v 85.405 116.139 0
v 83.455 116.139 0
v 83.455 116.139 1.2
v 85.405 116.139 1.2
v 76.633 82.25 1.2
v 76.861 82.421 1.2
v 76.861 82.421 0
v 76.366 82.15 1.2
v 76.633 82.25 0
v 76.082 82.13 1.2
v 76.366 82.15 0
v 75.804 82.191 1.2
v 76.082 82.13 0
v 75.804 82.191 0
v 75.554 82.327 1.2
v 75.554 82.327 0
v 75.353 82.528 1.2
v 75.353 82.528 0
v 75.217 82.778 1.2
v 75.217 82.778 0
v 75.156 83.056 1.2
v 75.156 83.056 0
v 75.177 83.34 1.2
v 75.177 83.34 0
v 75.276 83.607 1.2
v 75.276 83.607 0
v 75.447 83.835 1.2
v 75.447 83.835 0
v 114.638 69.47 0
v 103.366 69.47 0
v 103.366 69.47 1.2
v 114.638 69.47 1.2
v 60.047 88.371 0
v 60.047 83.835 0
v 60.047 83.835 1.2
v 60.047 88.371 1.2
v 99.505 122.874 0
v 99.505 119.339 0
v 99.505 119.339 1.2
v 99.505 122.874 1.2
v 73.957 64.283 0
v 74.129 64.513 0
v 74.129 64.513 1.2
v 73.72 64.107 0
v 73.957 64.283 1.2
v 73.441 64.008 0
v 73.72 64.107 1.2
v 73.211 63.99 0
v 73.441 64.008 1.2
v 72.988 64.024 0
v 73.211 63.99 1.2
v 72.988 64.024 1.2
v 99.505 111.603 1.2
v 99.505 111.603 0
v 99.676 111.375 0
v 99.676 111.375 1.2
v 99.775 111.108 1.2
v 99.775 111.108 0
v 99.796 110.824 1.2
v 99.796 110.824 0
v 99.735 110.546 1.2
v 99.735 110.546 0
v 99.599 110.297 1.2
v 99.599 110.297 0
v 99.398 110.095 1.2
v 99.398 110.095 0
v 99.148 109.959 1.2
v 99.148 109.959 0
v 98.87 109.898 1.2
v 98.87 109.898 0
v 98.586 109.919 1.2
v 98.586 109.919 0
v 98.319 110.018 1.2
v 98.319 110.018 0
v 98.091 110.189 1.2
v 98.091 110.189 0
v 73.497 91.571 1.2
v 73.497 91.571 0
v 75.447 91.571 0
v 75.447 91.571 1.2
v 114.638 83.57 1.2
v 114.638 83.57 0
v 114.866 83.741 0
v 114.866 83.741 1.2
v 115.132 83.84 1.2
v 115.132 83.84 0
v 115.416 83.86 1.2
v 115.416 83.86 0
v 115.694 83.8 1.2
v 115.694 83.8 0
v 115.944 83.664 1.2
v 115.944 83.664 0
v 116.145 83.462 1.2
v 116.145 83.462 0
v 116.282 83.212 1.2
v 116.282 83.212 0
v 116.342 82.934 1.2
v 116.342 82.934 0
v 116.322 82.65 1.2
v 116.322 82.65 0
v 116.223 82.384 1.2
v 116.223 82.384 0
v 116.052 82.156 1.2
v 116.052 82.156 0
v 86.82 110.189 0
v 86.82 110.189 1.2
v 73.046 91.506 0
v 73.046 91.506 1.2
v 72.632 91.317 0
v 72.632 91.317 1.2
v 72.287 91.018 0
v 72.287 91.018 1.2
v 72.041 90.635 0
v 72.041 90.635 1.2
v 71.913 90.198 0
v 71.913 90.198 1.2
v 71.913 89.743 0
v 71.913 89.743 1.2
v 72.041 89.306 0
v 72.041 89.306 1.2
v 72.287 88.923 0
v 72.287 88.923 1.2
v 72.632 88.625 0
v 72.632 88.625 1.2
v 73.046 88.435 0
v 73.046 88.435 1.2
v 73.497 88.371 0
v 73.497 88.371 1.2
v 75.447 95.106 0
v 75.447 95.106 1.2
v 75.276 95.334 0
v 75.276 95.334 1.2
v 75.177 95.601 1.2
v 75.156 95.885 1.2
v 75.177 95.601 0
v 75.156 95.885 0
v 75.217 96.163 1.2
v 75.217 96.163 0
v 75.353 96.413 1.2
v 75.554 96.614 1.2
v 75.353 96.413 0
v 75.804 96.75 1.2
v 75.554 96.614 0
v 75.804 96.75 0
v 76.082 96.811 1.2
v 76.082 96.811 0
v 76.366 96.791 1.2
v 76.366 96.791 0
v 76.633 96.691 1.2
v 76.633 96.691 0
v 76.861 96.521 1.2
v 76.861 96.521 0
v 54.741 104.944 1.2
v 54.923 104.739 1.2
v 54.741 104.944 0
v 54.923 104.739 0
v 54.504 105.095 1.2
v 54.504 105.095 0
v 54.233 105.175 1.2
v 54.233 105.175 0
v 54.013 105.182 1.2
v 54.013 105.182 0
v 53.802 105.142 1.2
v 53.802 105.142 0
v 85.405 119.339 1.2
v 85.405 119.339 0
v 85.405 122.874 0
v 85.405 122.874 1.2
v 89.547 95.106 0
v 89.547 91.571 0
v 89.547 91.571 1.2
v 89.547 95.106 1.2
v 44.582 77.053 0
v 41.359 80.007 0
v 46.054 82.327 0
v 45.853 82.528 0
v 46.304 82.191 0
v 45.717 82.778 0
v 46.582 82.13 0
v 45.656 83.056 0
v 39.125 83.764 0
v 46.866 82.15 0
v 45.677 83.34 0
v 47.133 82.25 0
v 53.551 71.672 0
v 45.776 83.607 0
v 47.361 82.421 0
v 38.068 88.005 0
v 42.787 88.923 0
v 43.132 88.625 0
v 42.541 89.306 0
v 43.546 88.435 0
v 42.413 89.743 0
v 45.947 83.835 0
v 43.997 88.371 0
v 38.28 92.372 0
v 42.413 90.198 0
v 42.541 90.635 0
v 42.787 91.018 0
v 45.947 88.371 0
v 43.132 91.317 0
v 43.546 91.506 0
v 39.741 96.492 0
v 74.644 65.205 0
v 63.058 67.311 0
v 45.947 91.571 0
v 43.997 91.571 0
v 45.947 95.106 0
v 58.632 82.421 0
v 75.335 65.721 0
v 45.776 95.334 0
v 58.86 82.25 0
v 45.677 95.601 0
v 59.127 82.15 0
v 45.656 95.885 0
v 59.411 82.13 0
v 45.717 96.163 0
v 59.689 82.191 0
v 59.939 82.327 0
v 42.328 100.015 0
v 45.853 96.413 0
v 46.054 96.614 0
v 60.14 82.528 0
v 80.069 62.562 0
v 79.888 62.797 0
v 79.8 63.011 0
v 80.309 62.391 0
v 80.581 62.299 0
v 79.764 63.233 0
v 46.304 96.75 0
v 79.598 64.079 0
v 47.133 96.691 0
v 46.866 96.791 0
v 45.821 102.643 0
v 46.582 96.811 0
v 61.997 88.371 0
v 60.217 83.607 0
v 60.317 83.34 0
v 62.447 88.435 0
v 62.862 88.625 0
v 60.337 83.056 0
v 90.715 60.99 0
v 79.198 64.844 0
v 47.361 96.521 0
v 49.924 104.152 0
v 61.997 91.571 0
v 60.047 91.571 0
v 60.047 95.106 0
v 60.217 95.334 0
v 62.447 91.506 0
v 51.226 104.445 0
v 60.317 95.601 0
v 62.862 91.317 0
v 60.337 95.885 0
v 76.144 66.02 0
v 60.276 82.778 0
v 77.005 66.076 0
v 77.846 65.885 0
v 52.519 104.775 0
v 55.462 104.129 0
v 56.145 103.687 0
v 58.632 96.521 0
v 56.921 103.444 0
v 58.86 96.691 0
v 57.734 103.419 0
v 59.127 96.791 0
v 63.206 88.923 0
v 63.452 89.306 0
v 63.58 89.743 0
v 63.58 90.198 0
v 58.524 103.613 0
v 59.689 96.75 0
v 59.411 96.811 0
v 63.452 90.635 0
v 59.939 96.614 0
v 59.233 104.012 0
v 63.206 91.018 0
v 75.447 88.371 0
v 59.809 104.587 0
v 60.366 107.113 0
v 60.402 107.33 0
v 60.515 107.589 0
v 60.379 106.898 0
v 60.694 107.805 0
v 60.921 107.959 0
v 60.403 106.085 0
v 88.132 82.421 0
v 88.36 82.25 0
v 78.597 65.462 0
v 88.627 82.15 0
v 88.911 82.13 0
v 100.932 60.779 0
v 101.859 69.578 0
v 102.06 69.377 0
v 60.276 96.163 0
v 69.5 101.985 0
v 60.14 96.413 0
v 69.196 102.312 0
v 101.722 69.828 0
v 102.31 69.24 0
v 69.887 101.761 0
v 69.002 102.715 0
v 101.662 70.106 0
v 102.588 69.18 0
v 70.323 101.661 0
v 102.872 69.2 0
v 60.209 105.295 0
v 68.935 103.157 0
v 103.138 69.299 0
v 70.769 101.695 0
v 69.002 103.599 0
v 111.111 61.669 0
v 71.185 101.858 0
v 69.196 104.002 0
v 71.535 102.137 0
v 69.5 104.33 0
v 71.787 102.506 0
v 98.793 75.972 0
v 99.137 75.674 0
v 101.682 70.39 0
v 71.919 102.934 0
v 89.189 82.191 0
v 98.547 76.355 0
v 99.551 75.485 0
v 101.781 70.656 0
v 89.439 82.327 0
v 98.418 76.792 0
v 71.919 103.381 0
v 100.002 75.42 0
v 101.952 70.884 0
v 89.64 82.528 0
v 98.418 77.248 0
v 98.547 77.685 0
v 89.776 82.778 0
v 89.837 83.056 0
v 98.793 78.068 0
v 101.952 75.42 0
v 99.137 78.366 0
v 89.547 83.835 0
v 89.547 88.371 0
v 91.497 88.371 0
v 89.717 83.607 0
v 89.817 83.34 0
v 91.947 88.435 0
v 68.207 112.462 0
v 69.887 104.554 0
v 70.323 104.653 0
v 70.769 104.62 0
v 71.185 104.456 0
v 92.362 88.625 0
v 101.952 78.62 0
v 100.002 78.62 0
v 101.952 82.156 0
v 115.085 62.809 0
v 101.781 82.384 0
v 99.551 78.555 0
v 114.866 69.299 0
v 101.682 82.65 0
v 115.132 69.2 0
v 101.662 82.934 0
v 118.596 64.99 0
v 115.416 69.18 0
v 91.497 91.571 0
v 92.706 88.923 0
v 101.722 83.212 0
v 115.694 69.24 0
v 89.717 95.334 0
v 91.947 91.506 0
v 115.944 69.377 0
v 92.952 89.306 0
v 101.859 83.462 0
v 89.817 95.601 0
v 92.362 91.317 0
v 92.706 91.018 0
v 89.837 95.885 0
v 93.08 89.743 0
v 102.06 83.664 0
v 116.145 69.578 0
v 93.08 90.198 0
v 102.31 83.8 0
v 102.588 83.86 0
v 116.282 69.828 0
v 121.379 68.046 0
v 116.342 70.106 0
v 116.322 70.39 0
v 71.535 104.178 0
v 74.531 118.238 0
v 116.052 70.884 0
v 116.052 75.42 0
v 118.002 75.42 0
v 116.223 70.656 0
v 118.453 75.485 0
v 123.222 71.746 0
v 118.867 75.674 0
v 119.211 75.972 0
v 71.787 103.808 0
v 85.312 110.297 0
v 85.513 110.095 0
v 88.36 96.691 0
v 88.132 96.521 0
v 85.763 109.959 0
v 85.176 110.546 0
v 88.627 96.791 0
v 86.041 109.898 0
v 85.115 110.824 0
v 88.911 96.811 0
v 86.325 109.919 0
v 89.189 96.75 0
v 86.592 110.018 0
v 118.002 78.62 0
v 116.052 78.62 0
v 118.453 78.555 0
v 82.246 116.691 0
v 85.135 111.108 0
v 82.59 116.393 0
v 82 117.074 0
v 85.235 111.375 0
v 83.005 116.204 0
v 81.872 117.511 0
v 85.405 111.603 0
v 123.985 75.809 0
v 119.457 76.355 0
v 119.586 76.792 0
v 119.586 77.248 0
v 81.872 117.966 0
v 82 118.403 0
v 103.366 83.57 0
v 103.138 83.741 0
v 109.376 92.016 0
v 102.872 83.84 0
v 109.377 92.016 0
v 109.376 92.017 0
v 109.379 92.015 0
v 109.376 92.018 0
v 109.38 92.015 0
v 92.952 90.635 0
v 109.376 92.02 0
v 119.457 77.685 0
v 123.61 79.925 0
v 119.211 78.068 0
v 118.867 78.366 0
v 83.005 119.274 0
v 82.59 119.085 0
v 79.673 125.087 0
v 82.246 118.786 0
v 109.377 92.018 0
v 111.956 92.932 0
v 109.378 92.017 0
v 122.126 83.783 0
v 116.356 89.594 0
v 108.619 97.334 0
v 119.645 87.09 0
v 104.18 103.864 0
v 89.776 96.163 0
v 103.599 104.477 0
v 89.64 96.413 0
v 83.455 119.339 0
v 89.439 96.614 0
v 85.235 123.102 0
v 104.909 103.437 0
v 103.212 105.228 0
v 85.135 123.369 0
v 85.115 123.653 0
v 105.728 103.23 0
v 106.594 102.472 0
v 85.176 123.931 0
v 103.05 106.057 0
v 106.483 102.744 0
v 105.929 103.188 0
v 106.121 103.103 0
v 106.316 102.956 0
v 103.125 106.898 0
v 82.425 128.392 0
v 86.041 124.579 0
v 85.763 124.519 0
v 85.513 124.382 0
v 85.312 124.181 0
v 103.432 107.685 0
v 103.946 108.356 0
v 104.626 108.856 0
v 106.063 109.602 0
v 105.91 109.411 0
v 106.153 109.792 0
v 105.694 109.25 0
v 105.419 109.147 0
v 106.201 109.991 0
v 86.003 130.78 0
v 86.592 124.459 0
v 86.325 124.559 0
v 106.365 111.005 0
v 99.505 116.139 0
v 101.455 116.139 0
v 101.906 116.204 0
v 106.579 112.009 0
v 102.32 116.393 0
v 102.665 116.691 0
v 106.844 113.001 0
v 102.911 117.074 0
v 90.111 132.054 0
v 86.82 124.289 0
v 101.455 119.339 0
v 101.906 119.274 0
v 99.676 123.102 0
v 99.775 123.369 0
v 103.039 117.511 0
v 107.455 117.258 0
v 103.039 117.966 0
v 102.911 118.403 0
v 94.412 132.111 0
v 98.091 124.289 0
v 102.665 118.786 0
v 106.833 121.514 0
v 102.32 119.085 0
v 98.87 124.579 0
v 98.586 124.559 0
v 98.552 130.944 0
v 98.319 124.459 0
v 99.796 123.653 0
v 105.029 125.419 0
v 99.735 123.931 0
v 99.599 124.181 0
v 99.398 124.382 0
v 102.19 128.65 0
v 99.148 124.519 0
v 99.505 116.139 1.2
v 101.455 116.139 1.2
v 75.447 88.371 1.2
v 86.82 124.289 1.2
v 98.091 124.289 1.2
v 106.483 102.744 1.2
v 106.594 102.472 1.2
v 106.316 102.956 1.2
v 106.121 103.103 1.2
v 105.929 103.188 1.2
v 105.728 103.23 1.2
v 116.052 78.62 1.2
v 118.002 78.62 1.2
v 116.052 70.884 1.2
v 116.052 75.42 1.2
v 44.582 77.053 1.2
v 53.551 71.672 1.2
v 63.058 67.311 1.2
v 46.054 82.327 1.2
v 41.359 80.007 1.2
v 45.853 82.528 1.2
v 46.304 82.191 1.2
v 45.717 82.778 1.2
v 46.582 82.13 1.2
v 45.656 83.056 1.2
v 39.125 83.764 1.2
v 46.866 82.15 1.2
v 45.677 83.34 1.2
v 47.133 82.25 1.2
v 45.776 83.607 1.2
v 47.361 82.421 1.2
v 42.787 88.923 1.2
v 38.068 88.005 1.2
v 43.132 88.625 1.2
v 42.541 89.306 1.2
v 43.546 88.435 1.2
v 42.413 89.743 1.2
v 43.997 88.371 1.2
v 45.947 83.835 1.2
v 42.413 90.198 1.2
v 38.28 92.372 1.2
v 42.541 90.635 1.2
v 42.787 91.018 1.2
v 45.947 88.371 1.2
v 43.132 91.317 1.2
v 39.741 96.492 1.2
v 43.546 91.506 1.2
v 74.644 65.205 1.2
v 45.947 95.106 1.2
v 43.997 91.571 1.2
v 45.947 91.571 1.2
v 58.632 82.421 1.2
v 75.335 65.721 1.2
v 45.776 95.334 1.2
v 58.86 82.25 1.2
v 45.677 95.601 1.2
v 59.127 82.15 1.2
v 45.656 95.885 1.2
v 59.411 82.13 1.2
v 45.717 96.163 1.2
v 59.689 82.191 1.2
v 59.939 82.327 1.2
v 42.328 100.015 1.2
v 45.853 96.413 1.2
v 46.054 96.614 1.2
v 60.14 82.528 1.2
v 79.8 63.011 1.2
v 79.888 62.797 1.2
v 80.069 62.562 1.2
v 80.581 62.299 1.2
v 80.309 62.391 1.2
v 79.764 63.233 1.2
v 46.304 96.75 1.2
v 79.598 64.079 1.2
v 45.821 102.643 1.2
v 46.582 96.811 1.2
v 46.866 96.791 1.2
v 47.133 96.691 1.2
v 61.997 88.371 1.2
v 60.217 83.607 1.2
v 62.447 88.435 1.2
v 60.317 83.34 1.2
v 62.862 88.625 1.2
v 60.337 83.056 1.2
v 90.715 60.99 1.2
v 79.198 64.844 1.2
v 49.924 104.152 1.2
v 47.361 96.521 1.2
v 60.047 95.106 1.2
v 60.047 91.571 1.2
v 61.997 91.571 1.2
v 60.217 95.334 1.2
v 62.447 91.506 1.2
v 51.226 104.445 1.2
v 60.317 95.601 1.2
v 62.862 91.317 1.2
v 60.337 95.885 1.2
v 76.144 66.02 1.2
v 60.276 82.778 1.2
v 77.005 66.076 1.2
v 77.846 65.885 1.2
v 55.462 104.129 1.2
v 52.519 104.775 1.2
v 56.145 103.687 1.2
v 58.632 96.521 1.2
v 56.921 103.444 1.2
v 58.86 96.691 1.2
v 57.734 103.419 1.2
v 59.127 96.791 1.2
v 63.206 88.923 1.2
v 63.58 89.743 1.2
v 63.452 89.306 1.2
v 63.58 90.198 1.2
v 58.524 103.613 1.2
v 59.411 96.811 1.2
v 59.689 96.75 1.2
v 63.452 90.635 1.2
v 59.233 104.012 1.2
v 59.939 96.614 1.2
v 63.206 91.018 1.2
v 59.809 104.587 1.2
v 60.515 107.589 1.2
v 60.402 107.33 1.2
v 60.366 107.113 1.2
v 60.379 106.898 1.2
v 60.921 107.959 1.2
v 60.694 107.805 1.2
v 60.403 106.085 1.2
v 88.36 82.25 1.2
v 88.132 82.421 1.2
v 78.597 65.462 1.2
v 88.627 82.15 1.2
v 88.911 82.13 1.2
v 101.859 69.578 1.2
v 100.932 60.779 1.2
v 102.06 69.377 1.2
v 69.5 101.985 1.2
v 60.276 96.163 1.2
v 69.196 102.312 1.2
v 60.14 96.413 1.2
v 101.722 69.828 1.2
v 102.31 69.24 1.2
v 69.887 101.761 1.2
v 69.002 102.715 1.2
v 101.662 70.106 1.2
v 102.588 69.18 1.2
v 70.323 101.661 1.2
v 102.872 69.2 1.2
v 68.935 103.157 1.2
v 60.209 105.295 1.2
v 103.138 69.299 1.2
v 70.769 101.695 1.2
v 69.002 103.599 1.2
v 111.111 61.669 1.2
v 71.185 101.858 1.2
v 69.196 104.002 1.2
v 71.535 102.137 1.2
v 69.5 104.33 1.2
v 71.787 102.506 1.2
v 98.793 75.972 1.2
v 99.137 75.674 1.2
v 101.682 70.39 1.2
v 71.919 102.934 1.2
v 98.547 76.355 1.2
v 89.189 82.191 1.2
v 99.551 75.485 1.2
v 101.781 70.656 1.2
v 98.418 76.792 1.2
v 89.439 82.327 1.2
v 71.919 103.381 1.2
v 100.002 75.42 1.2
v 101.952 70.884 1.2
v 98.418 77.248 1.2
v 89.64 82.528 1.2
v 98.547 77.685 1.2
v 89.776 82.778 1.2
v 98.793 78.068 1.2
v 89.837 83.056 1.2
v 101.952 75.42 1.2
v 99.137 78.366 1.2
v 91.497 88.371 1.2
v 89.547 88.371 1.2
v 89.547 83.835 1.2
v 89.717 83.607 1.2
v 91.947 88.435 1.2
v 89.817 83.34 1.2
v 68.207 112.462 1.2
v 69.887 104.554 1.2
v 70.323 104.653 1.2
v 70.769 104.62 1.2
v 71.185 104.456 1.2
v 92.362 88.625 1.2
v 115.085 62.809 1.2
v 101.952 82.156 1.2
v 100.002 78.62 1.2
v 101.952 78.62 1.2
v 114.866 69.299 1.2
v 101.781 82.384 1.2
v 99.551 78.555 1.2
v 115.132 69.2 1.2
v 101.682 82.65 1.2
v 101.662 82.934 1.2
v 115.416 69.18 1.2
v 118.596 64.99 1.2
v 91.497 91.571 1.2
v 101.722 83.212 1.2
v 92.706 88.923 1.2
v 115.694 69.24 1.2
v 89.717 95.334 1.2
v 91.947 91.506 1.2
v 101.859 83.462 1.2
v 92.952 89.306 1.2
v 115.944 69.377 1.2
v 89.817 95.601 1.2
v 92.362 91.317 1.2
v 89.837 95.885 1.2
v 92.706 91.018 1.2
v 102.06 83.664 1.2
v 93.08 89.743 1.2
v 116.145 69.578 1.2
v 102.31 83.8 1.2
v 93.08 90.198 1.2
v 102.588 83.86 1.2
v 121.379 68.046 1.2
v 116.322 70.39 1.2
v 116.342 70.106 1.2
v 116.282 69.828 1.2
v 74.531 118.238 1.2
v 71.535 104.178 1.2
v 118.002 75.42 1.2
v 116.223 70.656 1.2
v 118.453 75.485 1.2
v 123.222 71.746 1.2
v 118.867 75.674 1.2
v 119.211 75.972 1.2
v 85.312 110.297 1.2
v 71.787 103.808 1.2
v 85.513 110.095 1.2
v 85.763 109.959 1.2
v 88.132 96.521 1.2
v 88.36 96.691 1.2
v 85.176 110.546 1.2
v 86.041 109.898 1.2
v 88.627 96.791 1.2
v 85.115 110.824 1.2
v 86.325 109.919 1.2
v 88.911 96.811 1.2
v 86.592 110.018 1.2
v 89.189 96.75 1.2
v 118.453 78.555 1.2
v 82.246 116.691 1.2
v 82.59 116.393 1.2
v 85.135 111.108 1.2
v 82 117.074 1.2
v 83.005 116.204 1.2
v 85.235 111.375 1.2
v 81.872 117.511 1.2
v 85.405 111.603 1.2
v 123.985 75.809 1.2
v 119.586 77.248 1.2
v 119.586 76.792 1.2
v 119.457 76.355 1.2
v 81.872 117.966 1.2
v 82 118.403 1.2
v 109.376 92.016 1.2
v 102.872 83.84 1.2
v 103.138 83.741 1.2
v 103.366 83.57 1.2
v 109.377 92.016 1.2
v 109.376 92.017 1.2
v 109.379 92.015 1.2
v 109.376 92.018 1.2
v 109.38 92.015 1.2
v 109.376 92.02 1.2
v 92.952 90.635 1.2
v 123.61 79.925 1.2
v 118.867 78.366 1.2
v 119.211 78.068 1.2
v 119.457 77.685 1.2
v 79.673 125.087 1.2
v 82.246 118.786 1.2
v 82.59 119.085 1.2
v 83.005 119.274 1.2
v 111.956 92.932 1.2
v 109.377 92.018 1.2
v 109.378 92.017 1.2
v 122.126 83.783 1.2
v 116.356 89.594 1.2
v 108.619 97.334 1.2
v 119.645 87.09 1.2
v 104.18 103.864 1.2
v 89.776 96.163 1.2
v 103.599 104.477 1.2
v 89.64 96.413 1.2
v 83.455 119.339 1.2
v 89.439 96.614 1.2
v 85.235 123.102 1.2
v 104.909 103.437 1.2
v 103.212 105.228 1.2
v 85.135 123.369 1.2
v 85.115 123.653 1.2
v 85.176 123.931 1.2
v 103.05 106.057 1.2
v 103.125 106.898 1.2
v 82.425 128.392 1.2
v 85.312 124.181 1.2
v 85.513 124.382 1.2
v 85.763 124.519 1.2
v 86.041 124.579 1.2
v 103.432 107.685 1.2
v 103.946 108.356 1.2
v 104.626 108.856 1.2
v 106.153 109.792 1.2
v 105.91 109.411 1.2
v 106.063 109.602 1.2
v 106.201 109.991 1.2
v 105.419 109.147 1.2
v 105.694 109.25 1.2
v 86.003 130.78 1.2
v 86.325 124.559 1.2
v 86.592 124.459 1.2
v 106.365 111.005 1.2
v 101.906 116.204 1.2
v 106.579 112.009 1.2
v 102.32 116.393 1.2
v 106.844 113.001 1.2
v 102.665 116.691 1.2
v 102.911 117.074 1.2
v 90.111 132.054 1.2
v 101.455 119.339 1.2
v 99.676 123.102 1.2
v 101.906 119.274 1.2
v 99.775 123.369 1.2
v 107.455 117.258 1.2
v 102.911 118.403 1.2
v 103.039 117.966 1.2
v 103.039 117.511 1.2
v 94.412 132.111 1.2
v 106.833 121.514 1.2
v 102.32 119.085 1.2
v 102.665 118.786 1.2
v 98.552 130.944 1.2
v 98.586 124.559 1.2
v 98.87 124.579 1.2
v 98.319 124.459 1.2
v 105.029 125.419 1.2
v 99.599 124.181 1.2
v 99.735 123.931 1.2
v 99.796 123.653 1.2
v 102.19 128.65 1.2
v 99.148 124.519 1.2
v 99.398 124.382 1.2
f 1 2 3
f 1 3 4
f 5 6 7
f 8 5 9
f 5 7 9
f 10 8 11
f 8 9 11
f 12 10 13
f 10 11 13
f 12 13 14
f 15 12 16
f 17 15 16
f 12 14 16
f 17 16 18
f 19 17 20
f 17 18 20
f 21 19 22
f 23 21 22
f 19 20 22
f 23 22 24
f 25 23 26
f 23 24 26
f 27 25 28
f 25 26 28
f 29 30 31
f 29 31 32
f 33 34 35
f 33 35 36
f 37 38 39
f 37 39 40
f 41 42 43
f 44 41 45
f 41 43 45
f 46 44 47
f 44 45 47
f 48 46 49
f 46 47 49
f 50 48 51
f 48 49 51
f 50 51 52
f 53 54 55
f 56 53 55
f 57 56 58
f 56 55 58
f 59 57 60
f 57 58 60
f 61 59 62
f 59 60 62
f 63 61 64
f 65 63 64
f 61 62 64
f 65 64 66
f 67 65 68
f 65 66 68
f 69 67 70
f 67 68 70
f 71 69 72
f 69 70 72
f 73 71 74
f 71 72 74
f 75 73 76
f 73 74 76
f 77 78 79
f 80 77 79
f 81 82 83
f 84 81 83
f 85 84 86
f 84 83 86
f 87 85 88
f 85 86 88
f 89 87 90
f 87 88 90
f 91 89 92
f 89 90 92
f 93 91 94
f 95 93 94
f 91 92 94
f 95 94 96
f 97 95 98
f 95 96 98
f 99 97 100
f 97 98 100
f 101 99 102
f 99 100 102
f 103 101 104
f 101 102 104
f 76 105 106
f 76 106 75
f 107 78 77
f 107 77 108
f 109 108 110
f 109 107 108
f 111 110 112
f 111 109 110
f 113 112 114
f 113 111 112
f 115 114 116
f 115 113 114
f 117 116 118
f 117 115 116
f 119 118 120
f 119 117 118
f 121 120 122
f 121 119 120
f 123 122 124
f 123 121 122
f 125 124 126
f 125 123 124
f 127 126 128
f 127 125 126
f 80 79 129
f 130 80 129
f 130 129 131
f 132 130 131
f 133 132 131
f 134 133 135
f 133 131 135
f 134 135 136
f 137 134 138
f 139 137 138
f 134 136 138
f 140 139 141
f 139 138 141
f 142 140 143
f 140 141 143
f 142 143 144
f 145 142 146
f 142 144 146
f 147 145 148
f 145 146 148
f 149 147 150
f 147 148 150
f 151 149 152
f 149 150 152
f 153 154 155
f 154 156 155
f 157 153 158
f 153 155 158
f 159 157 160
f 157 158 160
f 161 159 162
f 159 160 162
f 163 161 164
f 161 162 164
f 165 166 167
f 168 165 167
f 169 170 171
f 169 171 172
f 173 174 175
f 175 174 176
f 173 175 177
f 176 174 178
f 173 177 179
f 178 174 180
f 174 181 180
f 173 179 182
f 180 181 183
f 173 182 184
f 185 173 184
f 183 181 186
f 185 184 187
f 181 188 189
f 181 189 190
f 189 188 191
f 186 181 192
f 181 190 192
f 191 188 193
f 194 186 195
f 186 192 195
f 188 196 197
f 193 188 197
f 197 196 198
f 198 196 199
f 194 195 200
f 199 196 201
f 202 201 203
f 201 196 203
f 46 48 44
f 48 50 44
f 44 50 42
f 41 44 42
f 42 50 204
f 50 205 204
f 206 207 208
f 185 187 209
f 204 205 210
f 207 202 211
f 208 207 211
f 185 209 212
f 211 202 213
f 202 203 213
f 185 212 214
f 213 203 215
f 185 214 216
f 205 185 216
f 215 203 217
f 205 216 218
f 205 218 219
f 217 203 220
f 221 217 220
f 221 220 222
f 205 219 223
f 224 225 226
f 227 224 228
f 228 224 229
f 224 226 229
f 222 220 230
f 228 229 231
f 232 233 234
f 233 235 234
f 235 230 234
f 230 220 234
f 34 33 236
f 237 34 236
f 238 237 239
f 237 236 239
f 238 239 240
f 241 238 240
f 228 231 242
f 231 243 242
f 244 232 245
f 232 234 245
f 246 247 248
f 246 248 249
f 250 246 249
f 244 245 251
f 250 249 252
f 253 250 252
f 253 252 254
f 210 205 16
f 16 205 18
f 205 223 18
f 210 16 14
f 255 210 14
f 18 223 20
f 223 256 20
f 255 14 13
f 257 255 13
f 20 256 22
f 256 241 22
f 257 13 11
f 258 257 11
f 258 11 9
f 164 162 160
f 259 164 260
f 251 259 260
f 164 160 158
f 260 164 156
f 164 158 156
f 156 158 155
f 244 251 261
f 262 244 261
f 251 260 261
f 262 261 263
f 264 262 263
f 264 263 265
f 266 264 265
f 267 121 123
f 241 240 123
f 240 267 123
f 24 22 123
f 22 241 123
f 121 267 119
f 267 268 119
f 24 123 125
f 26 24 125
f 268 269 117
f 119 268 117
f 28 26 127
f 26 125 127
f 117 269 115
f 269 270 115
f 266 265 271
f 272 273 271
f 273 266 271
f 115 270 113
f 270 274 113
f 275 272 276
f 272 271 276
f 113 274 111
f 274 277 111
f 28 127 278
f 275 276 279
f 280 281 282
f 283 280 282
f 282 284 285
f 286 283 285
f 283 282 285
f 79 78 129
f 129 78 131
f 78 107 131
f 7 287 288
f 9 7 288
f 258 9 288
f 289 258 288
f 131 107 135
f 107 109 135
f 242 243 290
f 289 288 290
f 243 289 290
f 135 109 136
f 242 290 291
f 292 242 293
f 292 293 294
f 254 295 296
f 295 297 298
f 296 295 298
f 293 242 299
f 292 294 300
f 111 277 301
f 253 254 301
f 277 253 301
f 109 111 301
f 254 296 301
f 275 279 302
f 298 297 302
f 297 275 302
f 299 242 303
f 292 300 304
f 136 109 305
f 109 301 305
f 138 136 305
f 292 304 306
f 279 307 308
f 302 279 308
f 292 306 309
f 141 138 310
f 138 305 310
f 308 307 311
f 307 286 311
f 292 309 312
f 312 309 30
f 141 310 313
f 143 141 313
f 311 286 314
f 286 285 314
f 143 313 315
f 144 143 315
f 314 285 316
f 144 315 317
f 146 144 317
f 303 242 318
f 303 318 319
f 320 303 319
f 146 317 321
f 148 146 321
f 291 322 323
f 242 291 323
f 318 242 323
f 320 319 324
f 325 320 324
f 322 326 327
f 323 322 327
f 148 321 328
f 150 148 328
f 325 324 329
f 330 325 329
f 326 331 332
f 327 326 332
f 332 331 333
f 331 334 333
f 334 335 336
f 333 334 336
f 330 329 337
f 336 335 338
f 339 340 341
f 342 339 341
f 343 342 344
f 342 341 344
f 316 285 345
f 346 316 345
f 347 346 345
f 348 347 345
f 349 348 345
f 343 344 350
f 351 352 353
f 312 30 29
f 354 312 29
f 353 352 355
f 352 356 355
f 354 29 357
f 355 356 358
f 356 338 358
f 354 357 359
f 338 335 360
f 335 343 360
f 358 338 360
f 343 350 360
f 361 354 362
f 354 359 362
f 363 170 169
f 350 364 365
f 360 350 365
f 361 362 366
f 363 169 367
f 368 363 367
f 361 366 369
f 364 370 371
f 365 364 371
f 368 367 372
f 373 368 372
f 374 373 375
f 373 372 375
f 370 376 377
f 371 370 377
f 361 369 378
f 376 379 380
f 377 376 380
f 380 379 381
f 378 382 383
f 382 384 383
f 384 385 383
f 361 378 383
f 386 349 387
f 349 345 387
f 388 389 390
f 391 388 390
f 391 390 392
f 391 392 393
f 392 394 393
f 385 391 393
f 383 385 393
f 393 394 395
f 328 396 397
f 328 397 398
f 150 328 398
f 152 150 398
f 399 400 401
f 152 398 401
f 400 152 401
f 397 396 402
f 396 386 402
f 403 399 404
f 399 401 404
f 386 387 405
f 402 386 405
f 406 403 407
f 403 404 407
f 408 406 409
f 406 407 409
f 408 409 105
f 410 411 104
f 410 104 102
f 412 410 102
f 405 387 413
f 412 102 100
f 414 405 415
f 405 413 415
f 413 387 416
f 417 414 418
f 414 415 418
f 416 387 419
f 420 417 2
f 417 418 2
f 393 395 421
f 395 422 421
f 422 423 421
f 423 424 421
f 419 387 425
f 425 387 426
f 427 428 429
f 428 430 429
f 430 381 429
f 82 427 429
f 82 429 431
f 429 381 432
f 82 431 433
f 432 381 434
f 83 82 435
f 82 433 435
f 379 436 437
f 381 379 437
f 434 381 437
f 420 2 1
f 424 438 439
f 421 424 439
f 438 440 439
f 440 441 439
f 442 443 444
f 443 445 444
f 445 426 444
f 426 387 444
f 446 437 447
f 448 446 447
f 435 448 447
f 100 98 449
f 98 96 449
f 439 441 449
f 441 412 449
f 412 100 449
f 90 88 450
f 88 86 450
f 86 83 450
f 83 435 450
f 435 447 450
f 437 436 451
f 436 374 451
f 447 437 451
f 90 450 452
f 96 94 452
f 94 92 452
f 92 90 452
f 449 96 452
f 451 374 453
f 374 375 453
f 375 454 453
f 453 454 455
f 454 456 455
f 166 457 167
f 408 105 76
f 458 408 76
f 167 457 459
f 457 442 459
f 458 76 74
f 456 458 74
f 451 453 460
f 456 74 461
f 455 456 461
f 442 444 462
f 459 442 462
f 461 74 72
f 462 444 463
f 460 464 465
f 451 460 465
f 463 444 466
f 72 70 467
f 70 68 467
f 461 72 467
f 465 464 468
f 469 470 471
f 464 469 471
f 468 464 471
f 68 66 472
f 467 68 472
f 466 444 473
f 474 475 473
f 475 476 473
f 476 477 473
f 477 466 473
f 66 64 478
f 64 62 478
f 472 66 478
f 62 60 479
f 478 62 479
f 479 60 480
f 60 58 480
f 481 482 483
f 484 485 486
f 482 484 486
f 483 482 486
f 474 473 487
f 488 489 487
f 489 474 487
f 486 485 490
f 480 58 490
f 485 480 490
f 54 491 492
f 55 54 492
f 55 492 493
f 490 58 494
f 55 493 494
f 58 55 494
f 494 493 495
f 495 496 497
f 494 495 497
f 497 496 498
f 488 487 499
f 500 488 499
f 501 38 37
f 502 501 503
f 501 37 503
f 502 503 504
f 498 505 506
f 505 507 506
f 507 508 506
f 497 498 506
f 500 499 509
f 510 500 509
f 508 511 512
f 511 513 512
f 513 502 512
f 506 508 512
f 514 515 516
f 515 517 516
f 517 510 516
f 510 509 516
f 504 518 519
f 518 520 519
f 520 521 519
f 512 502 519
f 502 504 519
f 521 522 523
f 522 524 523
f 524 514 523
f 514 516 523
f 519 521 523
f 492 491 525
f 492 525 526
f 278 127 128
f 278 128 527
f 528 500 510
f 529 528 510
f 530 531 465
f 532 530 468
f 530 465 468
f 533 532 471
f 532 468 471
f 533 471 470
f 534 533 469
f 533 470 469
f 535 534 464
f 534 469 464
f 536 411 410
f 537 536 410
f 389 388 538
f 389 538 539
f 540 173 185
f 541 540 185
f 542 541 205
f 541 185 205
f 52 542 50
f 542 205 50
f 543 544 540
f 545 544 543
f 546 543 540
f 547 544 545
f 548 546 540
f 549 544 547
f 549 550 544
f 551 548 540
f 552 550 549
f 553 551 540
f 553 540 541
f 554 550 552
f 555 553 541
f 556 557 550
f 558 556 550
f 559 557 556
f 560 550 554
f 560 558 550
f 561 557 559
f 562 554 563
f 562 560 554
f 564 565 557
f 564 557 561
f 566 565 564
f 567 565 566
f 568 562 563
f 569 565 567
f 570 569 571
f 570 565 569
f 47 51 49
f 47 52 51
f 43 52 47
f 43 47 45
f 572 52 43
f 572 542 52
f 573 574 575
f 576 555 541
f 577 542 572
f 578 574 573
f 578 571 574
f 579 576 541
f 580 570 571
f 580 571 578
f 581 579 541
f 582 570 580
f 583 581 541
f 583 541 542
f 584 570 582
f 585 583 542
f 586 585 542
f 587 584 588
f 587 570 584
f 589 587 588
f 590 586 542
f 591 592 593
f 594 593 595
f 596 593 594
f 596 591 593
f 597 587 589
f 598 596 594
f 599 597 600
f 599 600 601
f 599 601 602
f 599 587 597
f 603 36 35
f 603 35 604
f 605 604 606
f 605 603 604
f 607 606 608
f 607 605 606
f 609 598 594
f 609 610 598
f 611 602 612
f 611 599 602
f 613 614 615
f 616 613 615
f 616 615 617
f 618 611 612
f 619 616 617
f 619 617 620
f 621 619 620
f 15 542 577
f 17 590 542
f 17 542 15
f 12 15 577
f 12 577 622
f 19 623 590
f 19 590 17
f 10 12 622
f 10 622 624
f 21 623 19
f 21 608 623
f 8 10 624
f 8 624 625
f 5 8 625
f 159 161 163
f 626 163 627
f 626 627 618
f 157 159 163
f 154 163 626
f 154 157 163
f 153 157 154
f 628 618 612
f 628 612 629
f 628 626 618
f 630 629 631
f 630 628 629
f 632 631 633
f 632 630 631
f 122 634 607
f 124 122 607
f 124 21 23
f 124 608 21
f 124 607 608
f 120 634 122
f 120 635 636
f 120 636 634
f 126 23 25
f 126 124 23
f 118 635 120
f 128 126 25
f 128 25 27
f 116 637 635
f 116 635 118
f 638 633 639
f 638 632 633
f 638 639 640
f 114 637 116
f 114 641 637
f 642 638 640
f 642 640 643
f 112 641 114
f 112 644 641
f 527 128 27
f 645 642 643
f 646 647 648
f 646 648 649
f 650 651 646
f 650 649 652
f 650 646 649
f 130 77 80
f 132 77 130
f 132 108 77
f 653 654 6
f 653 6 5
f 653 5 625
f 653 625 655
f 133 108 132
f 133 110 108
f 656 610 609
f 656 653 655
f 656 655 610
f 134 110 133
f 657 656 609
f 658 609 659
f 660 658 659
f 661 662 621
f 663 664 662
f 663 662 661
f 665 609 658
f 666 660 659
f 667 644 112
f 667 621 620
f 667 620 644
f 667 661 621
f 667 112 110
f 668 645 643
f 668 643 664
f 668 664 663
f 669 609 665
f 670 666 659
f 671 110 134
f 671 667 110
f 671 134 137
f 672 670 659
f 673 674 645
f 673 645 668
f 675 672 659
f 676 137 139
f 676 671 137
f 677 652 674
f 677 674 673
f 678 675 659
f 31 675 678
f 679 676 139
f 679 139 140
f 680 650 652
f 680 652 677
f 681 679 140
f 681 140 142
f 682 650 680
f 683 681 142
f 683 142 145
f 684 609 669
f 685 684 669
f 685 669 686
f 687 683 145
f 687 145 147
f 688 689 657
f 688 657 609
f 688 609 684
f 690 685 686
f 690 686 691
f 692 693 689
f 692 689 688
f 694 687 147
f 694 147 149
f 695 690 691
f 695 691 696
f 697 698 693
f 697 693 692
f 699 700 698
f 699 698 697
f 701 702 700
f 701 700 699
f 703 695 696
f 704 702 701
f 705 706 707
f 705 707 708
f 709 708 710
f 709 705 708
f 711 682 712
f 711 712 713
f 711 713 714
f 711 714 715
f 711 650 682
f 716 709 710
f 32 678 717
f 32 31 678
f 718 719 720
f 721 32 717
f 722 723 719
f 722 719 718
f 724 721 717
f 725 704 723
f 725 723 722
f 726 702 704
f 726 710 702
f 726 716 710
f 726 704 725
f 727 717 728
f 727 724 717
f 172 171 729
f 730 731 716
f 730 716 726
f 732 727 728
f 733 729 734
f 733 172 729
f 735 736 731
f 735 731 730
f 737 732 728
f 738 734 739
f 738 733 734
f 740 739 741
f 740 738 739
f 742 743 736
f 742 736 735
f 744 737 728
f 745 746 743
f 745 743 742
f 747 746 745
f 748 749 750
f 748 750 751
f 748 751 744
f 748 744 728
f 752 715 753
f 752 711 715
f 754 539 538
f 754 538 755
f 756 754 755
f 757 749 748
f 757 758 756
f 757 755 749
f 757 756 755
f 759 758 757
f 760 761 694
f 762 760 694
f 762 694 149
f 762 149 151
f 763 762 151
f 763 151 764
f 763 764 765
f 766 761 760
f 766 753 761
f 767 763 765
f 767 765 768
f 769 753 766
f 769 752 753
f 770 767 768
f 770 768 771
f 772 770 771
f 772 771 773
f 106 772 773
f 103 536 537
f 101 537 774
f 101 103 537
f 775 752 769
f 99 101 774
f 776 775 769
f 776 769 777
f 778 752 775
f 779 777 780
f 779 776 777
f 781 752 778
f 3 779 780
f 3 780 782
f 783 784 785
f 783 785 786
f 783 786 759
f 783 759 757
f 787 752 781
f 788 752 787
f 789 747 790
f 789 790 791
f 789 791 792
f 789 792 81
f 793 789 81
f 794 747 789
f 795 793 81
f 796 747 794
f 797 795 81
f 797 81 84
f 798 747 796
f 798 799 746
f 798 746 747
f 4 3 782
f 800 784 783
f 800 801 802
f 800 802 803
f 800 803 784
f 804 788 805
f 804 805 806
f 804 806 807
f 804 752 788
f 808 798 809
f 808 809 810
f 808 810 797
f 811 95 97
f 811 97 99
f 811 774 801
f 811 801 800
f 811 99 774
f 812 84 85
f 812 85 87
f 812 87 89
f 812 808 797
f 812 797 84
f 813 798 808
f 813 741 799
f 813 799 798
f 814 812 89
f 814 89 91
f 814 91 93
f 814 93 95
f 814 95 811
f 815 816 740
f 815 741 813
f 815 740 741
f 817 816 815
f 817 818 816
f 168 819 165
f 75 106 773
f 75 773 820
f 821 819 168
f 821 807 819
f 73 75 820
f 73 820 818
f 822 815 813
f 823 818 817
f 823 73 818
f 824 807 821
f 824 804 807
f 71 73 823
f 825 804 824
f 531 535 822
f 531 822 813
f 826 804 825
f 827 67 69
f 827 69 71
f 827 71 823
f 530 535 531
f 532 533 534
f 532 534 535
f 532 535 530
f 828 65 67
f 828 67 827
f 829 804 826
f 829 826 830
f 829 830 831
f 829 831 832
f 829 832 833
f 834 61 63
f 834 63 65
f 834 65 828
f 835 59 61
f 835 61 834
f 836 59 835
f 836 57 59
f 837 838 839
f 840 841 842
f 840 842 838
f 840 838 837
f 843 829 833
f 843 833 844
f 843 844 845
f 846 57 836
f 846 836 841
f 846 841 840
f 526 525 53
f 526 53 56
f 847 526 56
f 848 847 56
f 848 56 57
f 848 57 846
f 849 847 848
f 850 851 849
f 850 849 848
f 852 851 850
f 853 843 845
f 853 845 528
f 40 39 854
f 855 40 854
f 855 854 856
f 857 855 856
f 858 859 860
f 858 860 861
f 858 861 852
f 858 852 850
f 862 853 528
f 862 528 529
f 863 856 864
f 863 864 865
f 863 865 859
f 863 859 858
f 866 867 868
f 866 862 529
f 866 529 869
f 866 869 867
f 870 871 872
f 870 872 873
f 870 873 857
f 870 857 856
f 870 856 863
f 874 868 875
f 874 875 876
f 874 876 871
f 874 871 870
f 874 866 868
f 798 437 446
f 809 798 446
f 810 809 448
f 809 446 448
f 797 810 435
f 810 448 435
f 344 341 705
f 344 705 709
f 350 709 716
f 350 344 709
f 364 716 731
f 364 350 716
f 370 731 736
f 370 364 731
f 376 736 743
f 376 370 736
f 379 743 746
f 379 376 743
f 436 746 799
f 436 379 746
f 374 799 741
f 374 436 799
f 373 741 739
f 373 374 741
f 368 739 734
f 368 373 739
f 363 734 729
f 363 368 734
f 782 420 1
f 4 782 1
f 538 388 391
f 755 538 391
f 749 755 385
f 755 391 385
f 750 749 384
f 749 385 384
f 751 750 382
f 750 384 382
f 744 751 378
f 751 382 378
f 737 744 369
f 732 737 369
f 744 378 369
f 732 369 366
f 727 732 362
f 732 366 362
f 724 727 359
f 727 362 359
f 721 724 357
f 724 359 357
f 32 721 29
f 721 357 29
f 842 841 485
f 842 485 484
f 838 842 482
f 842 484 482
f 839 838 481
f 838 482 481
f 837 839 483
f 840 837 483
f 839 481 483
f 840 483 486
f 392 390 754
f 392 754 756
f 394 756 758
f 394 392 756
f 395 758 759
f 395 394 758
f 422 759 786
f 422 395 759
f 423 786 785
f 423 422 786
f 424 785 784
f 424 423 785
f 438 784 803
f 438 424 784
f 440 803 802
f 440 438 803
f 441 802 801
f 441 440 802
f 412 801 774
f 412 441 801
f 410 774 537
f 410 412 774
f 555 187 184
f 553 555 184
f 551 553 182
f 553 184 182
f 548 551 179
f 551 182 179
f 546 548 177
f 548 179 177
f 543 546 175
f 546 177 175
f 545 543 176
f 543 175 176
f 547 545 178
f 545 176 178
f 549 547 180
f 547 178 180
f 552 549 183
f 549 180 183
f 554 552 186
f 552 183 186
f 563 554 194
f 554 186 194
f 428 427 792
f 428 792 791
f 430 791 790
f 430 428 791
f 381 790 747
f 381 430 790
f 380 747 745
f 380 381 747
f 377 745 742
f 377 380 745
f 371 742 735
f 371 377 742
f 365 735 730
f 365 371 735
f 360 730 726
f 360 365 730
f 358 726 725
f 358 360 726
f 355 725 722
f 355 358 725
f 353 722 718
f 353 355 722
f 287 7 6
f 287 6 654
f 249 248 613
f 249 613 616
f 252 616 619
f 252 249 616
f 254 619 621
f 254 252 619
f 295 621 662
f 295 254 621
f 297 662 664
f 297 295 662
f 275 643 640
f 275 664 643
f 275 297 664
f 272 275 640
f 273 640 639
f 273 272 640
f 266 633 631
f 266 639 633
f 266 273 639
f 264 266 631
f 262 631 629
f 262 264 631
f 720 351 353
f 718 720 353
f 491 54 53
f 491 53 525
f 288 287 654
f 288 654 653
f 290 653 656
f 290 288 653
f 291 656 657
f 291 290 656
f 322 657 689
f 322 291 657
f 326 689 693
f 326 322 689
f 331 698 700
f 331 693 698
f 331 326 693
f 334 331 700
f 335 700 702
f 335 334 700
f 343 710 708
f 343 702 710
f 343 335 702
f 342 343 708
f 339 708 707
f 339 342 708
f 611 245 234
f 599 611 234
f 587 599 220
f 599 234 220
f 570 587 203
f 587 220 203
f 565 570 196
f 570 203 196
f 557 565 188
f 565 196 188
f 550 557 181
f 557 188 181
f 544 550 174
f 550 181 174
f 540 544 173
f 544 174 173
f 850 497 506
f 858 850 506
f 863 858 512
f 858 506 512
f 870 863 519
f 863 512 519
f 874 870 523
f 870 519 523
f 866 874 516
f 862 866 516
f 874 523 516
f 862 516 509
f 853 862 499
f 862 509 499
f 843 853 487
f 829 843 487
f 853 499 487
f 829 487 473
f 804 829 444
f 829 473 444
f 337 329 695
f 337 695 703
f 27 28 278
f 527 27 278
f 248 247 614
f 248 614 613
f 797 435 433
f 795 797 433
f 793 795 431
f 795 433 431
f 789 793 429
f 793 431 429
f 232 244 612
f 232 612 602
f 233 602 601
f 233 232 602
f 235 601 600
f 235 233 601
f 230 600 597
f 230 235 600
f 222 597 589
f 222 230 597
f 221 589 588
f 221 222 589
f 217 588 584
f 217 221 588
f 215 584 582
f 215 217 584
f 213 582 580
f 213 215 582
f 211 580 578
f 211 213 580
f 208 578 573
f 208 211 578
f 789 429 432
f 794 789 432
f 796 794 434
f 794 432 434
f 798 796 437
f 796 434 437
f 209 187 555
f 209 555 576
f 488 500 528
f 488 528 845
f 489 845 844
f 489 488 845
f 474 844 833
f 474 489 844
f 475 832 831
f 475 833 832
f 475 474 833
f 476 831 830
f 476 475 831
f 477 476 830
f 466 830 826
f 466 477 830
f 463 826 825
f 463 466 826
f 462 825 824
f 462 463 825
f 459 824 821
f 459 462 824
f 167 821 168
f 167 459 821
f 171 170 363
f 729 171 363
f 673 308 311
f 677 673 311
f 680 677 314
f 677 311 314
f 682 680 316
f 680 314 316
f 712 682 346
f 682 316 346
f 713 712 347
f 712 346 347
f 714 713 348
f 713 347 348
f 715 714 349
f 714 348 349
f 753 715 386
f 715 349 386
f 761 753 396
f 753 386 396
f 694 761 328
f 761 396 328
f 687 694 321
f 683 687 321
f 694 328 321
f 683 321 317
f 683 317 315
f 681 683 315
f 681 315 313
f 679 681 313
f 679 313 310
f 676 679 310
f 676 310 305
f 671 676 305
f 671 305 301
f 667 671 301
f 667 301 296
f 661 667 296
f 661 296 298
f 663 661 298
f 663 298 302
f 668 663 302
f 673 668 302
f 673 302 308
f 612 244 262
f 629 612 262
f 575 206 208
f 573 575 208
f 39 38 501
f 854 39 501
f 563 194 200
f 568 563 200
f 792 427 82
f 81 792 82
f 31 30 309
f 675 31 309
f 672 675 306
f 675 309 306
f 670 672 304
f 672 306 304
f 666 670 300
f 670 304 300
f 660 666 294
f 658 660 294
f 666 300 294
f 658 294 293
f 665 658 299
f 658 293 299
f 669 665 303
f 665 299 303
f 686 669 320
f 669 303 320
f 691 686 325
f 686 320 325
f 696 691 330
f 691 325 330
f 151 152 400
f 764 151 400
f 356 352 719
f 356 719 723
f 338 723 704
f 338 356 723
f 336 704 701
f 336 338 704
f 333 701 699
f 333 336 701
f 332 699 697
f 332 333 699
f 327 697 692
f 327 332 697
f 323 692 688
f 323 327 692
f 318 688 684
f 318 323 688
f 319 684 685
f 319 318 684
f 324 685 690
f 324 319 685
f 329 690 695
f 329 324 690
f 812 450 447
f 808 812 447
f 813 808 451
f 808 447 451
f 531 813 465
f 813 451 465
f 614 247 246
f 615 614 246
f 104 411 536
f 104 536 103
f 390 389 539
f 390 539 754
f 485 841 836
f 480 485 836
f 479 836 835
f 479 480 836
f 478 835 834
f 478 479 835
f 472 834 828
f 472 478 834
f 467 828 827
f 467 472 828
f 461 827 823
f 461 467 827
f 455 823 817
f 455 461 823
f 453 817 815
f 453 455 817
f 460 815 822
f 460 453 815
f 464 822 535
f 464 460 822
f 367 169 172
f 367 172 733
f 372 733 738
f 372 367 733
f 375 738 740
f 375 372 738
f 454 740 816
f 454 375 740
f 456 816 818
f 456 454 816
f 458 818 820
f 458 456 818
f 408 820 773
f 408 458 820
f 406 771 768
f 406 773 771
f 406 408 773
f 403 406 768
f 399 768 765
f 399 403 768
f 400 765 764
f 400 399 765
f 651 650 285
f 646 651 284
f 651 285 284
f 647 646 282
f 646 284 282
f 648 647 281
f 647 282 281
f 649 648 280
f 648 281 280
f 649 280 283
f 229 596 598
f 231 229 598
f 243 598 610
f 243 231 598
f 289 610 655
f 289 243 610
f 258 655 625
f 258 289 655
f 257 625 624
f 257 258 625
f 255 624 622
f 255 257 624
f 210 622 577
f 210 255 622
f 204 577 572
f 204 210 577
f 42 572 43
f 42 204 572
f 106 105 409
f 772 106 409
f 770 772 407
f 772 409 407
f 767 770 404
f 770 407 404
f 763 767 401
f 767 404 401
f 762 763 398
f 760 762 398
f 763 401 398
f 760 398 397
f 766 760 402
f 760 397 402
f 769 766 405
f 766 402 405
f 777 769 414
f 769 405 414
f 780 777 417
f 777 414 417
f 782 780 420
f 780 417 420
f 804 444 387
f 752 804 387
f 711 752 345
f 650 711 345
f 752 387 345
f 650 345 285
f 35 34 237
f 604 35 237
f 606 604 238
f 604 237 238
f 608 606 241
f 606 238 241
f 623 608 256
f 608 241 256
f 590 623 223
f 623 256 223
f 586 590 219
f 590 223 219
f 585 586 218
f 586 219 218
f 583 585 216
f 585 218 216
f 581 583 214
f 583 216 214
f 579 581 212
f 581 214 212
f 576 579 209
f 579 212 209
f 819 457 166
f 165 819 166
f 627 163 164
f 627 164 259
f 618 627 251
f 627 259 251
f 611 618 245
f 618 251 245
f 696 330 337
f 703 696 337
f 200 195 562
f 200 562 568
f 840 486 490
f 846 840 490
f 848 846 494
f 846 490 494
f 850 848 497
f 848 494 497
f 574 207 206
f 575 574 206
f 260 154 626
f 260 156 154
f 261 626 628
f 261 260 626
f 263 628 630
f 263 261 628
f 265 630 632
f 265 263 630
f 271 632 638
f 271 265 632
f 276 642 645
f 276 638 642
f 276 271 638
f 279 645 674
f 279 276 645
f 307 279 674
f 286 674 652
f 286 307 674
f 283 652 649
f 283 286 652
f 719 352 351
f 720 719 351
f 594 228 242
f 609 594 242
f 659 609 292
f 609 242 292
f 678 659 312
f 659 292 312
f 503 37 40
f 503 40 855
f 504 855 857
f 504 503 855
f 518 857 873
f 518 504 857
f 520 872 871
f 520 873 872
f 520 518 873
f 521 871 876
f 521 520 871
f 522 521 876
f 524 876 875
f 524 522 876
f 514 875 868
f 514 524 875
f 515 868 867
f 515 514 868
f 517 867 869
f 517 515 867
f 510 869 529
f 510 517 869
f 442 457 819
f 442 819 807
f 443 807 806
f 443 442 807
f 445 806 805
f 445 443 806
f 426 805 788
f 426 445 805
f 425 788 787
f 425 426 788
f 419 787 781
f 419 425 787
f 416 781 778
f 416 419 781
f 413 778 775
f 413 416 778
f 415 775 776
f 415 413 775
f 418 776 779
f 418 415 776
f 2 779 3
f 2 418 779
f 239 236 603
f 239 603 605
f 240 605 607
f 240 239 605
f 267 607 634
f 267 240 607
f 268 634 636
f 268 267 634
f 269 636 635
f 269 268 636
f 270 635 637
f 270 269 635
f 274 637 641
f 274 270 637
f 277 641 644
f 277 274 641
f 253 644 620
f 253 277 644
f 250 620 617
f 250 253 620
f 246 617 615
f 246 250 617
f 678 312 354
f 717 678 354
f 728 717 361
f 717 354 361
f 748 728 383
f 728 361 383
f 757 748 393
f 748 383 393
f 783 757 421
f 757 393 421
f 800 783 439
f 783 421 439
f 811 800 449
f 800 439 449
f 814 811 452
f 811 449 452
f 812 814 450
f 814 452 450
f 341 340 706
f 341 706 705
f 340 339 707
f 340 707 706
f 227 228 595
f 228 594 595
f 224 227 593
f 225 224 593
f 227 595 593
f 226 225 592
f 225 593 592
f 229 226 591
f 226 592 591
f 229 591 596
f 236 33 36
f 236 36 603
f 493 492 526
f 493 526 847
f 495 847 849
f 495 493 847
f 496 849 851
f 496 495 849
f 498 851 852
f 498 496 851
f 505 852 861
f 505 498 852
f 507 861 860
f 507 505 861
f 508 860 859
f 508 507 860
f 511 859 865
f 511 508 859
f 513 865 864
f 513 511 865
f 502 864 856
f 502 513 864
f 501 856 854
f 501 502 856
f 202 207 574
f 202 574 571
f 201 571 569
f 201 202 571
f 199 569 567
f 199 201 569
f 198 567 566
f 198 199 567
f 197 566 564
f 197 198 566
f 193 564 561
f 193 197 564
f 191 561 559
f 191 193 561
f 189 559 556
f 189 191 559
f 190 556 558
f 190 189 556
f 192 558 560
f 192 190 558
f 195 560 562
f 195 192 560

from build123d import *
from build123d.topology import SkipClean

# Parameters (mm, degrees)
BOSS_EXTRUDE1_DEPTH   = 1.2
SKETCH8_3_R           = 3
CUT_EXTRUDE1_DEPTH    = 182.287051241
SKETCH16_R            = 1.6
SKETCH16_W            = 18
SKETCH16_H            = 3.2
CUT_EXTRUDE2_DEPTH    = 182.287051241
CUT_EXTRUDE3_DEPTH    = 182.287051241
SKETCH9_W             = 14.1
SKETCH9_H             = 14.1
CUT_EXTRUDE4_DEPTH    = 182.287051241
F_3_0MM_DOWEL_HOLE1_D = 3
FILLET1_R             = 1


with BuildPart() as part:
    # Sketch8 → Boss-Extrude1 (new body)
    with BuildSketch(Plane.XY):
        with BuildLine():
            ThreePointArc((73.852303576, 63.794594289), (73.863549821, 63.839319131), (73.875482243, 63.883865813))
            ThreePointArc((73.875482243, 63.883865813), (76.767270103, 63.085390407), (79.729789892, 62.612657392))
            ThreePointArc((79.729789892, 62.612657392), (79.717062502, 62.538833177), (79.702495752, 62.465349771))
            ThreePointArc((79.702495752, 62.465349771), (95.373691885, 60.7573177), (111.111302129, 61.669121188))
            ThreePointArc((111.111302129, 61.669121188), (123.74416397, 73.75113123), (116.356165737, 89.593531525))
            ThreePointArc((116.356165737, 89.593531525), (107.510169126, 99.635128091), (106.844308874, 113.000828513))
            ThreePointArc((106.844308874, 113.000828513), (98.551785503, 130.943955248), (79.67265081, 125.087333856))
            ThreePointArc((79.67265081, 125.087333856), (66.957923375, 111.551078569), (49.923987164, 104.152462611))
            ThreePointArc((49.923987164, 104.152462611), (38.279791522, 92.371702096), (44.581782069, 77.053134095))
            ThreePointArc((44.581782069, 77.053134095), (58.651333394, 69.17496271), (73.852303576, 63.794594289))
        make_face()
        with BuildLine():
            ThreePointArc((56.72077423, 104.000844147), (56.721683918, 104.00117089), (56.7225936, 104.001497652))
            ThreePointArc((56.7225936, 104.001497652), (56.755397532, 103.992206145), (56.788325126, 103.983362865))
            ThreePointArc((56.788325126, 103.983362865), (56.754559843, 103.992142785), (56.72077423, 104.000844147))
        make_face(mode=Mode.SUBTRACT)
        with BuildLine():
            ThreePointArc((109.376341775, 92.015545509), (109.37615287, 92.017539878), (109.375963817, 92.019534234))
            ThreePointArc((109.375963817, 92.019534234), (109.377797318, 92.017499849), (109.379631064, 92.015465685))
            ThreePointArc((109.379631064, 92.015465685), (109.377986421, 92.015505684), (109.376341775, 92.015545509))
        make_face(mode=Mode.SUBTRACT)
        with BuildLine():
            ThreePointArc((103.532400156, 106.396636288), (103.543227812, 106.407709628), (103.554044399, 106.418793781))
            ThreePointArc((103.554044399, 106.418793781), (103.552293137, 106.396310438), (103.550744757, 106.373812212))
            ThreePointArc((103.550744757, 106.373812212), (103.541575551, 106.385226737), (103.532400156, 106.396636288))
        make_face(mode=Mode.SUBTRACT)
        with BuildLine():
            ThreePointArc((104.021801646, 107.681154775), (104.021865069, 107.684582448), (104.021929019, 107.688010111))
            ThreePointArc((104.021929019, 107.688010111), (104.063142491, 107.7381429), (104.104138674, 107.788453533))
            ThreePointArc((104.104138674, 107.788453533), (104.062244422, 107.735361058), (104.021801646, 107.681154775))
        make_face(mode=Mode.SUBTRACT)
    extrude(amount=BOSS_EXTRUDE1_DEPTH)

    # Sketch8<3> → Cut-Extrude1 (cut, through all)
    with SkipClean():  # the faces are left unmerged after this step: merging them gives an invalid solid
        with BuildSketch(Plane.XY):
            with Locations((106.04559389, 106.21341333)):
                Circle(SKETCH8_3_R)
            with Locations((76.767270103, 63.085390407)):
                Circle(SKETCH8_3_R)
            with Locations((57.420286528, 106.402169345)):
                Circle(SKETCH8_3_R)
        extrude(amount=CUT_EXTRUDE1_DEPTH, mode=Mode.SUBTRACT)

    # Sketch16 → Cut-Extrude2 (cut, through all)
    with SkipClean():  # the faces are left unmerged after this step: merging them gives an invalid solid
        with BuildSketch(Plane.XY):
            with Locations((43.996556322, 89.970524089)):
                Circle(SKETCH16_R)
            with Locations((61.996556322, 89.970524089)):
                Circle(SKETCH16_R)
            with Locations((73.496556322, 89.970524089)):
                Circle(SKETCH16_R)
            with Locations((91.496556322, 89.970524089)):
                Circle(SKETCH16_R)
            with Locations((100.001946024, 77.020067852)):
                Circle(SKETCH16_R)
            with Locations((118.001946024, 77.020067852)):
                Circle(SKETCH16_R)
            with Locations((83.45540719, 117.738694526)):
                Circle(SKETCH16_R)
            with Locations((101.45540719, 117.738694526)):
                Circle(SKETCH16_R)
            with Locations((52.996556322, 89.970524089)):
                Rectangle(SKETCH16_W, SKETCH16_H)
            with Locations((82.496556322, 89.970524089)):
                Rectangle(SKETCH16_W, SKETCH16_H)
            with Locations((109.001946024, 77.020067852)):
                Rectangle(SKETCH16_W, SKETCH16_H)
            with Locations((92.45540719, 117.738694526)):
                Rectangle(SKETCH16_W, SKETCH16_H)
        extrude(amount=CUT_EXTRUDE2_DEPTH, mode=Mode.SUBTRACT)

    # Sketch14 → Cut-Extrude3 (cut, through all)
    with SkipClean():  # the faces are left unmerged after this step: merging them gives an invalid solid
        with BuildSketch(Plane.XY):
            with BuildLine():
                Line((45.946556322, 95.106310527), (47.360769884, 96.520524089))
                ThreePointArc((47.360769884, 96.520524089), (45.946556322, 96.520524089), (45.946556322, 95.106310527))
            make_face()
            with BuildLine():
                Line((45.946556322, 83.834737652), (47.360769884, 82.420524089))
                ThreePointArc((47.360769884, 82.420524089), (45.946556322, 82.420524089), (45.946556322, 83.834737652))
            make_face()
            with BuildLine():
                Line((58.63234276, 82.420524089), (60.046556322, 83.834737652))
                ThreePointArc((60.046556322, 83.834737652), (60.046556322, 82.420524089), (58.63234276, 82.420524089))
            make_face()
            with BuildLine():
                Line((58.63234276, 96.520524089), (60.046556322, 95.106310527))
                ThreePointArc((60.046556322, 95.106310527), (60.046556322, 96.520524089), (58.63234276, 96.520524089))
            make_face()
            with BuildLine():
                Line((85.40540719, 111.602908088), (86.819620752, 110.188694526))
                ThreePointArc((86.819620752, 110.188694526), (85.40540719, 110.188694526), (85.40540719, 111.602908088))
            make_face()
            with BuildLine():
                Line((98.091193628, 110.188694526), (99.50540719, 111.602908088))
                ThreePointArc((99.50540719, 111.602908088), (99.50540719, 110.188694526), (98.091193628, 110.188694526))
            make_face()
            with BuildLine():
                Line((98.091193628, 124.288694526), (99.50540719, 122.874480963))
                ThreePointArc((99.50540719, 122.874480963), (99.50540719, 124.288694526), (98.091193628, 124.288694526))
            make_face()
            with BuildLine():
                Line((85.40540719, 122.874480963), (86.819620752, 124.288694526))
                ThreePointArc((86.819620752, 124.288694526), (85.40540719, 124.288694526), (85.40540719, 122.874480963))
            make_face()
            with BuildLine():
                Line((101.951946024, 82.155854289), (103.366159586, 83.570067852))
                ThreePointArc((103.366159586, 83.570067852), (101.951946024, 83.570067852), (101.951946024, 82.155854289))
            make_face()
            with BuildLine():
                Line((101.951946024, 70.884281414), (103.366159586, 69.470067852))
                ThreePointArc((103.366159586, 69.470067852), (101.951946024, 69.470067852), (101.951946024, 70.884281414))
            make_face()
            with BuildLine():
                Line((114.637732461, 69.470067852), (116.051946024, 70.884281414))
                ThreePointArc((116.051946024, 70.884281414), (116.051946024, 69.470067852), (114.637732461, 69.470067852))
            make_face()
            with BuildLine():
                Line((116.051946024, 82.155854289), (114.637732461, 83.570067852))
                ThreePointArc((114.637732461, 83.570067852), (116.051946024, 83.570067852), (116.051946024, 82.155854289))
            make_face()
            with BuildLine():
                Line((76.860769884, 96.520524089), (75.446556322, 95.106310527))
                ThreePointArc((75.446556322, 95.106310527), (75.446556322, 96.520524089), (76.860769884, 96.520524089))
            make_face()
            with BuildLine():
                Line((88.13234276, 96.520524089), (89.546556322, 95.106310527))
                ThreePointArc((89.546556322, 95.106310527), (89.546556322, 96.520524089), (88.13234276, 96.520524089))
            make_face()
            with BuildLine():
                Line((89.546556322, 83.834737652), (88.13234276, 82.420524089))
                ThreePointArc((88.13234276, 82.420524089), (89.546556322, 82.420524089), (89.546556322, 83.834737652))
            make_face()
            with BuildLine():
                Line((75.446556322, 83.834737652), (76.860769884, 82.420524089))
                ThreePointArc((76.860769884, 82.420524089), (75.446556322, 82.420524089), (75.446556322, 83.834737652))
            make_face()
        extrude(amount=CUT_EXTRUDE3_DEPTH, mode=Mode.SUBTRACT)

    # Sketch9 → Cut-Extrude4 (cut, through all)
    with SkipClean():  # the faces are left unmerged after this step: merging them gives an invalid solid
        with BuildSketch(Plane.XY):
            with Locations((52.996556322, 89.470524089)):
                Rectangle(SKETCH9_W, SKETCH9_H)
            with Locations((82.496556322, 89.470524089)):
                Rectangle(SKETCH9_W, SKETCH9_H)
            with Locations((109.001946024, 76.520067852)):
                Rectangle(SKETCH9_W, SKETCH9_H)
            with Locations((92.45540719, 117.238694526)):
                Rectangle(SKETCH9_W, SKETCH9_H)
        extrude(amount=CUT_EXTRUDE4_DEPTH, mode=Mode.SUBTRACT)

    # Ø3.0mm Dowel Hole1 (through all)
    with Locations(Plane.XY.offset(1.2)):
        with Locations((70.435309654, 103.157249982)):
            Hole(F_3_0MM_DOWEL_HOLE1_D / 2)

    # Fillet1
    fillet1_edges = [part.edges().sort_by_distance(p)[0] for p in [
        (79.702495752, 62.465349771, 0.6),
        (73.852303576, 63.794594289, 0.6),
        (106.42311517, 103.237261841, 0.6),
        (106.111211206, 109.212695638, 0.6),
        (54.596217873, 105.389926178, 0.6),
        (60.17229201, 107.596516793, 0.6),
    ]]
    fillet(fillet1_edges, radius=FILLET1_R)


solid = part.part
